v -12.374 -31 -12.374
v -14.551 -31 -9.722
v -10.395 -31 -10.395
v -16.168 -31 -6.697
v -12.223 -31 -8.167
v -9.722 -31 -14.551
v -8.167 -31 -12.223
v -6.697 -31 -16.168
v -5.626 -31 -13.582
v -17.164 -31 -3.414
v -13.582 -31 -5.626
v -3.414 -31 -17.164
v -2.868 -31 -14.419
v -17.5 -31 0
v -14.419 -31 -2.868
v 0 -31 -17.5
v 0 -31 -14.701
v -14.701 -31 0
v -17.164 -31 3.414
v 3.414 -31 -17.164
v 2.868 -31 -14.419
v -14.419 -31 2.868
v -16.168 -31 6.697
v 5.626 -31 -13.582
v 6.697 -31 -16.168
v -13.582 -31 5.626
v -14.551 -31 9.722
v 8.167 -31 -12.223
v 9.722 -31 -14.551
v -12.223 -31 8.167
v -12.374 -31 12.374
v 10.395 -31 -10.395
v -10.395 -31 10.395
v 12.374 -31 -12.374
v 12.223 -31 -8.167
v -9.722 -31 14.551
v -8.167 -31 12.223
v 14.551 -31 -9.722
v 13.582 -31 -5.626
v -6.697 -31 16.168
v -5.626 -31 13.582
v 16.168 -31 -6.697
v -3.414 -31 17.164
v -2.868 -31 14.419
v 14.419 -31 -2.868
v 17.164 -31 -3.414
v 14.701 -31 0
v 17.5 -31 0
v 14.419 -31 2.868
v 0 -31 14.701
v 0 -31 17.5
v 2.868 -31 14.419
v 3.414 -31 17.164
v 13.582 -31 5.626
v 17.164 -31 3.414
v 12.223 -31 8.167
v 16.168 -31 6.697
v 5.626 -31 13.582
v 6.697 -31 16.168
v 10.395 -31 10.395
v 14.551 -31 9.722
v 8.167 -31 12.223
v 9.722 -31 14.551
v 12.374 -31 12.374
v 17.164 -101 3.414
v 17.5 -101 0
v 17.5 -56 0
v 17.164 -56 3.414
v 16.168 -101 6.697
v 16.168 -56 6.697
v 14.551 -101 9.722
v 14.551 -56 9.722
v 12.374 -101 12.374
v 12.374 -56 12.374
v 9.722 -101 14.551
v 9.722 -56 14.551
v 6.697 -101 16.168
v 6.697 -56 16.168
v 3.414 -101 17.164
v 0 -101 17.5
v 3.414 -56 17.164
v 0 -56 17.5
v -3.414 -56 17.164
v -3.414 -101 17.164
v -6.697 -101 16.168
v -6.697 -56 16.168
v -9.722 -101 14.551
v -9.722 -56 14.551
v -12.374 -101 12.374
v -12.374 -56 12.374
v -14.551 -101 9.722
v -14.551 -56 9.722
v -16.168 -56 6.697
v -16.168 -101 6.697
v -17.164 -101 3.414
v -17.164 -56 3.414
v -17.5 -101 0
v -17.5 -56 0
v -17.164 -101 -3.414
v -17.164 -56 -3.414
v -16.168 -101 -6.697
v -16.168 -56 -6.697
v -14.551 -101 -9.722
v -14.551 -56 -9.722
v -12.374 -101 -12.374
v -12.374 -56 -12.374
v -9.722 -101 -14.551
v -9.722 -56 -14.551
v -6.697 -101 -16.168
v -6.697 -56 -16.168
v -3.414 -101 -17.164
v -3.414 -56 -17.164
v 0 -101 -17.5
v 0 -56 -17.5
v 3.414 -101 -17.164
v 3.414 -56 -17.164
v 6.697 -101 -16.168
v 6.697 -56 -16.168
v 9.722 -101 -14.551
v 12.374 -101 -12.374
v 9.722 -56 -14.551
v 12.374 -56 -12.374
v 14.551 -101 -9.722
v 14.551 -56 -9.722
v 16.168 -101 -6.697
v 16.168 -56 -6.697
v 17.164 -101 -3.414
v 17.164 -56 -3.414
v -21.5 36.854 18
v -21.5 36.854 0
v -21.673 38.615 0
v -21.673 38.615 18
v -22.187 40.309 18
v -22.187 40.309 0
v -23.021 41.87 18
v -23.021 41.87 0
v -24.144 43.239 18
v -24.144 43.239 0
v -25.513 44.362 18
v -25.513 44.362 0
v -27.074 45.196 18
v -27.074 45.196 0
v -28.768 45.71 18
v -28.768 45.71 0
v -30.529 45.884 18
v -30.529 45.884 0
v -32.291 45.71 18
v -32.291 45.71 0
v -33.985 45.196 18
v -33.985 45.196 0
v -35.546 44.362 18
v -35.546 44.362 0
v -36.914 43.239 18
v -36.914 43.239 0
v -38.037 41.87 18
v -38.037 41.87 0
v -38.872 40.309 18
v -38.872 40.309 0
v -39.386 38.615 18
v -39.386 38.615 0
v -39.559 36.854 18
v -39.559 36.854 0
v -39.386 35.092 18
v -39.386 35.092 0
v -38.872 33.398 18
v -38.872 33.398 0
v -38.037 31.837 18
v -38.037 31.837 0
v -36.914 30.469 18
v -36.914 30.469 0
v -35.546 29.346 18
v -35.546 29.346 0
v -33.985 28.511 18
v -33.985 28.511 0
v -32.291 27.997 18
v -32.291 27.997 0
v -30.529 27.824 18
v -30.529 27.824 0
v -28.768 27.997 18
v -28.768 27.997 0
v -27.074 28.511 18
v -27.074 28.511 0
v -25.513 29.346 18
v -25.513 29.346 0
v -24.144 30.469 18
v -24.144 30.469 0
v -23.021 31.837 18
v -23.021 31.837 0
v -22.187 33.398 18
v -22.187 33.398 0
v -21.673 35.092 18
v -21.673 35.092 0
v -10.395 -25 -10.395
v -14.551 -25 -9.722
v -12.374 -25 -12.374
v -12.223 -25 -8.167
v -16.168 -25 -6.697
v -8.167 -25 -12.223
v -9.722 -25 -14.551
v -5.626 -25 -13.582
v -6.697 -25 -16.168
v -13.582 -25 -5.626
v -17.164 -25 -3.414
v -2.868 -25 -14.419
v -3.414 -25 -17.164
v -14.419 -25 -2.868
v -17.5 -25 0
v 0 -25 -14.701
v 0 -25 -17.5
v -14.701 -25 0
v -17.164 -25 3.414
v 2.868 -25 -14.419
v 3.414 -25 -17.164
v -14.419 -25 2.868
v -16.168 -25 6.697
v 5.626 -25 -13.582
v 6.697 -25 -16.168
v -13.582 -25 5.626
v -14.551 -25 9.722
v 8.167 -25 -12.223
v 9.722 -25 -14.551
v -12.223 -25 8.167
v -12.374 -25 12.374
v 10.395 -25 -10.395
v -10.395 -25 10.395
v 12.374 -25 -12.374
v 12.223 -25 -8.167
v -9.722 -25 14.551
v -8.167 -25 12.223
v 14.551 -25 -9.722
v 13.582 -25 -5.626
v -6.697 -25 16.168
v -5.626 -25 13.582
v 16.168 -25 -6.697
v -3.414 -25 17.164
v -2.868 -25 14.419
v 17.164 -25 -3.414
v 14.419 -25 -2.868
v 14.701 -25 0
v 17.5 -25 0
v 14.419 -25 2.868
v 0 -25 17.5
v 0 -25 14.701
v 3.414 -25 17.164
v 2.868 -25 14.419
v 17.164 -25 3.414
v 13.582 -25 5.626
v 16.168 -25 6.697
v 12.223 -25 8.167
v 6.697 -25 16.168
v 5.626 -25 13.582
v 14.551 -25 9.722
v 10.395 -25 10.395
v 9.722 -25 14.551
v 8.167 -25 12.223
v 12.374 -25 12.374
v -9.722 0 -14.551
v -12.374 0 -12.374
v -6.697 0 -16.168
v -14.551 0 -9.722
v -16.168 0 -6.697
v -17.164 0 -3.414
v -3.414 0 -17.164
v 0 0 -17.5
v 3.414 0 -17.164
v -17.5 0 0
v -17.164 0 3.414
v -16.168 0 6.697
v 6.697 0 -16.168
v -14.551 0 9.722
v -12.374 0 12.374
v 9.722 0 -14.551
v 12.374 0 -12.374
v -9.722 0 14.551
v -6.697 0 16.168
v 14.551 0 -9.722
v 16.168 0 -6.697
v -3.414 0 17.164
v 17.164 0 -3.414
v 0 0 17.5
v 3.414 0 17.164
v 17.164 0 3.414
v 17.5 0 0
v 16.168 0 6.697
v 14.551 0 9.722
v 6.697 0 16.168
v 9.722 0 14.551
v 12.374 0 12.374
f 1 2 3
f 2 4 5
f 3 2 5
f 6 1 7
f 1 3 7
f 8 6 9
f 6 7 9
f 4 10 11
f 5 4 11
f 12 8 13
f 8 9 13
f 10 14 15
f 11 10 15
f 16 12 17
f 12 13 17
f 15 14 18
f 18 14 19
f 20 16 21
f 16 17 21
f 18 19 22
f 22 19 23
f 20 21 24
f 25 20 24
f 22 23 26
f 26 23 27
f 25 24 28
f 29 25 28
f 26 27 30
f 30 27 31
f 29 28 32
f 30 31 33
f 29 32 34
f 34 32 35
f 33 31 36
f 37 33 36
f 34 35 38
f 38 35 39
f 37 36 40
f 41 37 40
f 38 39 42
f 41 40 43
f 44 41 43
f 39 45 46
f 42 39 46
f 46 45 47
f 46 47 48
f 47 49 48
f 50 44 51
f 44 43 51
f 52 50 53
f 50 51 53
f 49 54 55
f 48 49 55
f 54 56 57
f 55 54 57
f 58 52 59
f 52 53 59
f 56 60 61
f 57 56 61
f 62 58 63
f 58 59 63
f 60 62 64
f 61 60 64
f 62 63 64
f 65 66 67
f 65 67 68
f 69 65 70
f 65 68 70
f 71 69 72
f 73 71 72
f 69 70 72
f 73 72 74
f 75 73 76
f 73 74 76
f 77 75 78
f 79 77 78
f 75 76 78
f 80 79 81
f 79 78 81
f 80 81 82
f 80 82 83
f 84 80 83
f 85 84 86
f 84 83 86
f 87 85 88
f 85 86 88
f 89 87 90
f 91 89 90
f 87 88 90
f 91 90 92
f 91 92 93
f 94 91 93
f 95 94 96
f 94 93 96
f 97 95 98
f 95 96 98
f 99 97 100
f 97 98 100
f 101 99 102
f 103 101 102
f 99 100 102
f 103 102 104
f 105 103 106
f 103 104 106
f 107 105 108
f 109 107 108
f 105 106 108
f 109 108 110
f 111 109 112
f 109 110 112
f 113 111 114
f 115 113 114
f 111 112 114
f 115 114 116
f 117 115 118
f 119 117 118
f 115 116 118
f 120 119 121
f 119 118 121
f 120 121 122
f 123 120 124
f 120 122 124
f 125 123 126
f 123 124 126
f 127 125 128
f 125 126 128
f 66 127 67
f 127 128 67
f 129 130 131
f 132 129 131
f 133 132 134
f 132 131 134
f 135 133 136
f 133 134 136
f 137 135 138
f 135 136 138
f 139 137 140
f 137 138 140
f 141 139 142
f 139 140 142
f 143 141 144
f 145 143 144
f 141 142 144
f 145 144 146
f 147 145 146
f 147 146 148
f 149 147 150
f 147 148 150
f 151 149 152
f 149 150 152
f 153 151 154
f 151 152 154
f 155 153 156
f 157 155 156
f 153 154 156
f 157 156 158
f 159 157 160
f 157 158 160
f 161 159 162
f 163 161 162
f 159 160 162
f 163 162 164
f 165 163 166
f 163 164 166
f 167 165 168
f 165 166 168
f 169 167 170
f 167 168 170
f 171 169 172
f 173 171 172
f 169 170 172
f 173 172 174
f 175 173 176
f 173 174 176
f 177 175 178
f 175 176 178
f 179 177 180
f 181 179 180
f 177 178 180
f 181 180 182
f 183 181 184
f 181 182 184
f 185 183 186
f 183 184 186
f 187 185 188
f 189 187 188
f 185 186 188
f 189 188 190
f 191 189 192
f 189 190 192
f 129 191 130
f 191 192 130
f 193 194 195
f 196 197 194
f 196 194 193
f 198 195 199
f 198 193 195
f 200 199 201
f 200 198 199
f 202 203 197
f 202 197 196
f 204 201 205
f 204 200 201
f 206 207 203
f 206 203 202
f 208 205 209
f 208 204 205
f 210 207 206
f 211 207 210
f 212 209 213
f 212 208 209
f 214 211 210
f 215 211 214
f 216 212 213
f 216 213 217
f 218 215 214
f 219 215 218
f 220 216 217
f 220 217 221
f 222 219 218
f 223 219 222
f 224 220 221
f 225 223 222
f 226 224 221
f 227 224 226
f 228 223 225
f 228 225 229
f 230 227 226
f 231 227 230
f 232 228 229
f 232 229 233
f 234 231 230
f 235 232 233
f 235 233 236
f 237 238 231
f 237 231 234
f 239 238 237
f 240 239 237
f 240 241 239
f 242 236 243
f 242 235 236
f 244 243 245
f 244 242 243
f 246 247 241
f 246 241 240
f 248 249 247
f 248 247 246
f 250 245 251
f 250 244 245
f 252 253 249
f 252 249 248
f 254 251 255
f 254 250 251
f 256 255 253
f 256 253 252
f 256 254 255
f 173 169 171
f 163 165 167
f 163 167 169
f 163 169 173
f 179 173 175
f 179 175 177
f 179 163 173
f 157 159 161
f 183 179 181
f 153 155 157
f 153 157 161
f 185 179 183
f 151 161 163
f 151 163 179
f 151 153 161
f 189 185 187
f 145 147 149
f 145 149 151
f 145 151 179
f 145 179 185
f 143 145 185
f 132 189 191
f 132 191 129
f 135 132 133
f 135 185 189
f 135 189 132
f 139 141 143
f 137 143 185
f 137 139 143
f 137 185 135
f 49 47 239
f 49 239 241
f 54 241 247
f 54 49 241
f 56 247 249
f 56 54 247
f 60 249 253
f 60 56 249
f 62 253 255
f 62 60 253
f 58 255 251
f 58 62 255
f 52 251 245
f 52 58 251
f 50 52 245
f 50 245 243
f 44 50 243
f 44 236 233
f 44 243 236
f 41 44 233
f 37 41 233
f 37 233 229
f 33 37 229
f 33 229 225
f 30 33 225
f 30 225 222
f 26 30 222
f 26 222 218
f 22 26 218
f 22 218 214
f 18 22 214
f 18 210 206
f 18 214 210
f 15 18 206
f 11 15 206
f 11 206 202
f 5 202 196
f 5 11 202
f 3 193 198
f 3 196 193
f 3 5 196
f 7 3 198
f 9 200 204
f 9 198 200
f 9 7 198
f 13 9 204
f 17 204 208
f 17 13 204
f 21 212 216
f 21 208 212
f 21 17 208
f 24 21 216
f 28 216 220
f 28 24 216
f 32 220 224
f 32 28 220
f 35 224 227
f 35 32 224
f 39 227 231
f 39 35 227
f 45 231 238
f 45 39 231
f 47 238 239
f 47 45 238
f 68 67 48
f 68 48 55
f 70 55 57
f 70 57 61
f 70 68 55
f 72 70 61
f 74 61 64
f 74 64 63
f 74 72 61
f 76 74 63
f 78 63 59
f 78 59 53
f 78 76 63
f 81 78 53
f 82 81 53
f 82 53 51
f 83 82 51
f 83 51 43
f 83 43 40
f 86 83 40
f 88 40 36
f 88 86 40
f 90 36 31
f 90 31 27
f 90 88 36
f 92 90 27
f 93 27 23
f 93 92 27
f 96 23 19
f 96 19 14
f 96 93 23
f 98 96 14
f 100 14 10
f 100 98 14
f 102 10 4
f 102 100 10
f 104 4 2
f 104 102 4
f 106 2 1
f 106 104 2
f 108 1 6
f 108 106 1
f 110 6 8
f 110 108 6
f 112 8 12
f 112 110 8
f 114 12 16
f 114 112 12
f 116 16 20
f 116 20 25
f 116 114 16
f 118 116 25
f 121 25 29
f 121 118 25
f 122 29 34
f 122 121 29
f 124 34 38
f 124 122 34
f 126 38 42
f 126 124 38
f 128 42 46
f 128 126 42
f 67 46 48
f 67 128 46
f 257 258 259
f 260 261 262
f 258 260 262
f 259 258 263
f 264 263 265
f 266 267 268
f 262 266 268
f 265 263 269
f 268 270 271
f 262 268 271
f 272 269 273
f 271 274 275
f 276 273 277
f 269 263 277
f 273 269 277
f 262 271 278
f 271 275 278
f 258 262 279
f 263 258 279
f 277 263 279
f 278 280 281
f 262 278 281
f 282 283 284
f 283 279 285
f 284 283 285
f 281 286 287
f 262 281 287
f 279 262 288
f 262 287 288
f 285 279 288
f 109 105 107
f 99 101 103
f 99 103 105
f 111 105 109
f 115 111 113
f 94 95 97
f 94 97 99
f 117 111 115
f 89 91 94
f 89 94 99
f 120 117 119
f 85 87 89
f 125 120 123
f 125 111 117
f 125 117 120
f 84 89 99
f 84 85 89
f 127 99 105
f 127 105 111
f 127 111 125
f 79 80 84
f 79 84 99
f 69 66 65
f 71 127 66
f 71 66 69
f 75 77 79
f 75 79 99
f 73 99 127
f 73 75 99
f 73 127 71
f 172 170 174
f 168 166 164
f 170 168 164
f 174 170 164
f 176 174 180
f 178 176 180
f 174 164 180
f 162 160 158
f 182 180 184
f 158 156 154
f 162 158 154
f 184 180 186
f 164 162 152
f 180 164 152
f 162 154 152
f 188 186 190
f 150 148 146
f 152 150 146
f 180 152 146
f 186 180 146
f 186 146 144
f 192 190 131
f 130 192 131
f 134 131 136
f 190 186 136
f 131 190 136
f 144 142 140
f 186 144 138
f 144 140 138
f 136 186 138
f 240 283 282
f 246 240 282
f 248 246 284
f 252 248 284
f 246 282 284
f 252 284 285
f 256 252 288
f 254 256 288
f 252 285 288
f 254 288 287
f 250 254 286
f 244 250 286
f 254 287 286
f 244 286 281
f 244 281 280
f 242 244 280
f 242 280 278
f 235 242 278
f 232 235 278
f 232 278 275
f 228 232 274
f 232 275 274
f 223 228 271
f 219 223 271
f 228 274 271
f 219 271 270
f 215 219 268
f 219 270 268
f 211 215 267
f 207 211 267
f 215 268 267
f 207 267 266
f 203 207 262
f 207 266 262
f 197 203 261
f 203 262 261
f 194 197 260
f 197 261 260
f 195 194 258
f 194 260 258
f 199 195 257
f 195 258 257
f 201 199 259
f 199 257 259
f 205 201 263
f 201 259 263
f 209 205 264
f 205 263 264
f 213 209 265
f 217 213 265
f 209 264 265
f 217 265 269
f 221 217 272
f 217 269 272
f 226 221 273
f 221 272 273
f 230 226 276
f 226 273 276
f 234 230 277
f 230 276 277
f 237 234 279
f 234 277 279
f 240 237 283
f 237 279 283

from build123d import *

# Parameters (mm, degrees)
F0_R     = 17.5
F1_DEPTH = 25
F2_R     = 14.701
F3_DEPTH = 28
F5_DEPTH = 45
F6_R     = 9.0298312591
F7_DEPTH = 18


with BuildPart() as f1:
    # F0 (on Front) → F1 (new body)
    with BuildSketch(Plane.XZ):
        Circle(F0_R)
    extrude(amount=F1_DEPTH)

    # F2 (on Front) → F3 (join)
    with BuildSketch(Plane.XZ):
        Circle(F2_R)
    extrude(amount=F3_DEPTH)

    # F4: F1 across face


with BuildPart() as f1_1:
    add(f1.part)
    add(f1.part.mirror(Plane.XZ.offset(28)))

    # F5 (add): a face of the model
    f5_faces = [f1_1.faces().sort_by_distance(p)[0] for p in [
        (0, -56, 0),
    ]]
    extrude(f5_faces, amount=F5_DEPTH)


with BuildPart() as f7:
    # F6 (on Top) → F7 (new body)
    with BuildSketch(Plane.XY):
        with Locations((-30.5293500423, 36.8537791073)):
            Circle(F6_R)
    extrude(amount=F7_DEPTH)


solid = Compound([f1_1.part, f7.part])
